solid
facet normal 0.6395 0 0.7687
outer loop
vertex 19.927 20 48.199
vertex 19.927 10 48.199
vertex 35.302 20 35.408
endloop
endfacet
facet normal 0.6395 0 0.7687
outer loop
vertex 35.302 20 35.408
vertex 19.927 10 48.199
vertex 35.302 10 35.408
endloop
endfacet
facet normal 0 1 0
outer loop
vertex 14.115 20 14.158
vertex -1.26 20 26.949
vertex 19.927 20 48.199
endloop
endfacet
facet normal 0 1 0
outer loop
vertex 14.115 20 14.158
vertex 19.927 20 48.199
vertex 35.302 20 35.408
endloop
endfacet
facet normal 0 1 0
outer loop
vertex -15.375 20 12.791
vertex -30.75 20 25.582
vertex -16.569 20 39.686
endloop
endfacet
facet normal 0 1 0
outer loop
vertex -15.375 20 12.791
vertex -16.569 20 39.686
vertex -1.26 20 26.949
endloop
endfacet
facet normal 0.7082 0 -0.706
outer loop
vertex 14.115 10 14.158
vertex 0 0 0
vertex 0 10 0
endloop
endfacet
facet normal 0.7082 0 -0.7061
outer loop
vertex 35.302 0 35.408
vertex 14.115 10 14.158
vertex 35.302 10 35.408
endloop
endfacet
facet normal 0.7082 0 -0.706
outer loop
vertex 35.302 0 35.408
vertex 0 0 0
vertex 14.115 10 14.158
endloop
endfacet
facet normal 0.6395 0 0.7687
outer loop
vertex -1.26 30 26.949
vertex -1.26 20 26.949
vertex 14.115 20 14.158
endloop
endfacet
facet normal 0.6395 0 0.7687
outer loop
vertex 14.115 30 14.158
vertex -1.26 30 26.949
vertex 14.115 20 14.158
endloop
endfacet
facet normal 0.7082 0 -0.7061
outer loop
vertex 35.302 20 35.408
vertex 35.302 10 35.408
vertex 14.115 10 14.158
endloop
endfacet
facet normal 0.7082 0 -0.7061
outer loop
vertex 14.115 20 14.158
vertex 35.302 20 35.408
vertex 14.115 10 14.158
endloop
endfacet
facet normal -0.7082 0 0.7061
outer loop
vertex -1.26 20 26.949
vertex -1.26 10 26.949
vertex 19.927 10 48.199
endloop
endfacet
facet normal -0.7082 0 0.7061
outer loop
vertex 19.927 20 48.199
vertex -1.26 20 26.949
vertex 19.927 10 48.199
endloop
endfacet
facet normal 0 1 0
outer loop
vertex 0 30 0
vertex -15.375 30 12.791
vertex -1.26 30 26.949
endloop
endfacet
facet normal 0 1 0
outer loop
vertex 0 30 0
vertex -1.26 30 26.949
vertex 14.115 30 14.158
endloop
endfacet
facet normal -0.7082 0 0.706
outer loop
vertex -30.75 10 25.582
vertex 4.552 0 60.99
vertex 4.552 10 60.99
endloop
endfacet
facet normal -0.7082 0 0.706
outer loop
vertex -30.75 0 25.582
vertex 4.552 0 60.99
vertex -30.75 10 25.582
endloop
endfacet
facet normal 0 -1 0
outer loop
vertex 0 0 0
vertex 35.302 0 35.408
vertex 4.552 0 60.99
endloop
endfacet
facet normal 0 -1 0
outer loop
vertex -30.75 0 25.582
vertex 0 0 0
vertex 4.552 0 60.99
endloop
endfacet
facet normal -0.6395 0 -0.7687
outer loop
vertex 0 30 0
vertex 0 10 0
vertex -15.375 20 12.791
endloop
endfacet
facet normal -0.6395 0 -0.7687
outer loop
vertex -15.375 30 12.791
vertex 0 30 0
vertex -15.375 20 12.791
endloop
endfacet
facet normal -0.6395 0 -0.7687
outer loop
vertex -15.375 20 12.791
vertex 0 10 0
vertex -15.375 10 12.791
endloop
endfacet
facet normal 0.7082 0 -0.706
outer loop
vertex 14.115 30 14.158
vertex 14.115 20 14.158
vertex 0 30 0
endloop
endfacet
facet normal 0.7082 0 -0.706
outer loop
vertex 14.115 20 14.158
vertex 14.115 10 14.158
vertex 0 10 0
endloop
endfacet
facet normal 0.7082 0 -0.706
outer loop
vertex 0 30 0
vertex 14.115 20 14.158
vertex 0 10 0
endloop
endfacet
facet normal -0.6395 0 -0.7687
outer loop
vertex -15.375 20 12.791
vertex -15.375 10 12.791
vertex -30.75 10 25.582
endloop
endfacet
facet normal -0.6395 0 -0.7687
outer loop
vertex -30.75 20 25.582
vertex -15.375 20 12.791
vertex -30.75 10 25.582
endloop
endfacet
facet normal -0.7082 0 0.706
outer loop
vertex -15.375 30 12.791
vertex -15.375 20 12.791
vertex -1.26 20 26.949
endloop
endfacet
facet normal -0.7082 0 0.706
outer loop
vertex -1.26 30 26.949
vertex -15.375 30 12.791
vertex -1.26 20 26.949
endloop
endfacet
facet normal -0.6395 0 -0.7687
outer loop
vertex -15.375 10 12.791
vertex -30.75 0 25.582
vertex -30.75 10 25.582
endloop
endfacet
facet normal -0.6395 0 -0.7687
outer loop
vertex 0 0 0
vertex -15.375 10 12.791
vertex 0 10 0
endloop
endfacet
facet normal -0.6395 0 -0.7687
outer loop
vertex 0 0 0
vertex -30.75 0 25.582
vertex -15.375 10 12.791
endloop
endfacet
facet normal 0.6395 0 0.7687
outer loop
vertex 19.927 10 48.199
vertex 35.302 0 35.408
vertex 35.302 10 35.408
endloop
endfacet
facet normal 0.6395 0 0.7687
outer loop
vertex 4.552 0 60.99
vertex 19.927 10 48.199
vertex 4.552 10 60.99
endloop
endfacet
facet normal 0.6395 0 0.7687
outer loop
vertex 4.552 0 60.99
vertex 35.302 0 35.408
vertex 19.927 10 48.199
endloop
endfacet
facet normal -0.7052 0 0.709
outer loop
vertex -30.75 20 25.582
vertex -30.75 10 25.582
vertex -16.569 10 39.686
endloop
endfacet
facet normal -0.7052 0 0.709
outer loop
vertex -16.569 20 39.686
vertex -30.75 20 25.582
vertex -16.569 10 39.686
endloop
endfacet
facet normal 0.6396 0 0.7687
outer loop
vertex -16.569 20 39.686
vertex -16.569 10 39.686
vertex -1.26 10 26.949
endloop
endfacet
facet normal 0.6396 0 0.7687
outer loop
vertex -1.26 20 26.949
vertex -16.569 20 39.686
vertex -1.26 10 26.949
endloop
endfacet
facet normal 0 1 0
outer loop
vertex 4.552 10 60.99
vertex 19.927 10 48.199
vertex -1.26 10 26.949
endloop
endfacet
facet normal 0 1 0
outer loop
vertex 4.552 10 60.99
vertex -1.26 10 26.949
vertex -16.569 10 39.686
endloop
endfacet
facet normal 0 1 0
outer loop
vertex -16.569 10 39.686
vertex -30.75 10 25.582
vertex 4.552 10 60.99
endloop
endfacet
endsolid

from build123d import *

# Parameters (mm, degrees)
BOSS_EXTRUDE1_DEPTH = 10
BOSS_EXTRUDE2_DEPTH = 10
BOSS_EXTRUDE3_DEPTH = 30
BOSS_EXTRUDE5_DEPTH = 20


with BuildPart() as part:
    # Sketch1 → Boss-Extrude1 (new body)
    with BuildSketch(Plane(origin=(0, 0, 0), x_dir=(1, 0, 0), z_dir=(0, 1, 0))):
        Polygon((0, 0), (35.302133222, -35.408464948), (4.552111931, -60.990415434), (-30.75002129, -25.581950485), align=None)
    extrude(amount=BOSS_EXTRUDE1_DEPTH)

    # Sketch2 → Boss-Extrude2 (add)
    with BuildSketch(Plane(origin=(0, 10, 0), x_dir=(1, 0, 0), z_dir=(0, 1, 0))):
        Polygon((-15.375010645, -12.790975243), (-30.75002129, -25.581950485), (-16.56947049, -39.685566298), (-1.259664797, -26.948837193), align=None)
    extrude(amount=BOSS_EXTRUDE2_DEPTH)

    # Sketch3 → Boss-Extrude3 (add)
    with BuildSketch(Plane(origin=(0, 0, 0), x_dir=(1, 0, 0), z_dir=(0, 1, 0))):
        Polygon((0, 0), (-15.375010645, -12.790975243), (-1.259664797, -26.948837193), (14.115345848, -14.15786195), align=None)
    extrude(amount=BOSS_EXTRUDE3_DEPTH)

    # Sketch4 → Boss-Extrude5 (add)
    with BuildSketch(Plane(origin=(0, 0, 0), x_dir=(1, 0, 0), z_dir=(0, 1, 0))):
        Polygon((14.115345848, -14.15786195), (-1.259664797, -26.948837193), (19.927122576, -48.199440191), (35.302133222, -35.408464948), align=None)
    extrude(amount=BOSS_EXTRUDE5_DEPTH)


solid = part.part
